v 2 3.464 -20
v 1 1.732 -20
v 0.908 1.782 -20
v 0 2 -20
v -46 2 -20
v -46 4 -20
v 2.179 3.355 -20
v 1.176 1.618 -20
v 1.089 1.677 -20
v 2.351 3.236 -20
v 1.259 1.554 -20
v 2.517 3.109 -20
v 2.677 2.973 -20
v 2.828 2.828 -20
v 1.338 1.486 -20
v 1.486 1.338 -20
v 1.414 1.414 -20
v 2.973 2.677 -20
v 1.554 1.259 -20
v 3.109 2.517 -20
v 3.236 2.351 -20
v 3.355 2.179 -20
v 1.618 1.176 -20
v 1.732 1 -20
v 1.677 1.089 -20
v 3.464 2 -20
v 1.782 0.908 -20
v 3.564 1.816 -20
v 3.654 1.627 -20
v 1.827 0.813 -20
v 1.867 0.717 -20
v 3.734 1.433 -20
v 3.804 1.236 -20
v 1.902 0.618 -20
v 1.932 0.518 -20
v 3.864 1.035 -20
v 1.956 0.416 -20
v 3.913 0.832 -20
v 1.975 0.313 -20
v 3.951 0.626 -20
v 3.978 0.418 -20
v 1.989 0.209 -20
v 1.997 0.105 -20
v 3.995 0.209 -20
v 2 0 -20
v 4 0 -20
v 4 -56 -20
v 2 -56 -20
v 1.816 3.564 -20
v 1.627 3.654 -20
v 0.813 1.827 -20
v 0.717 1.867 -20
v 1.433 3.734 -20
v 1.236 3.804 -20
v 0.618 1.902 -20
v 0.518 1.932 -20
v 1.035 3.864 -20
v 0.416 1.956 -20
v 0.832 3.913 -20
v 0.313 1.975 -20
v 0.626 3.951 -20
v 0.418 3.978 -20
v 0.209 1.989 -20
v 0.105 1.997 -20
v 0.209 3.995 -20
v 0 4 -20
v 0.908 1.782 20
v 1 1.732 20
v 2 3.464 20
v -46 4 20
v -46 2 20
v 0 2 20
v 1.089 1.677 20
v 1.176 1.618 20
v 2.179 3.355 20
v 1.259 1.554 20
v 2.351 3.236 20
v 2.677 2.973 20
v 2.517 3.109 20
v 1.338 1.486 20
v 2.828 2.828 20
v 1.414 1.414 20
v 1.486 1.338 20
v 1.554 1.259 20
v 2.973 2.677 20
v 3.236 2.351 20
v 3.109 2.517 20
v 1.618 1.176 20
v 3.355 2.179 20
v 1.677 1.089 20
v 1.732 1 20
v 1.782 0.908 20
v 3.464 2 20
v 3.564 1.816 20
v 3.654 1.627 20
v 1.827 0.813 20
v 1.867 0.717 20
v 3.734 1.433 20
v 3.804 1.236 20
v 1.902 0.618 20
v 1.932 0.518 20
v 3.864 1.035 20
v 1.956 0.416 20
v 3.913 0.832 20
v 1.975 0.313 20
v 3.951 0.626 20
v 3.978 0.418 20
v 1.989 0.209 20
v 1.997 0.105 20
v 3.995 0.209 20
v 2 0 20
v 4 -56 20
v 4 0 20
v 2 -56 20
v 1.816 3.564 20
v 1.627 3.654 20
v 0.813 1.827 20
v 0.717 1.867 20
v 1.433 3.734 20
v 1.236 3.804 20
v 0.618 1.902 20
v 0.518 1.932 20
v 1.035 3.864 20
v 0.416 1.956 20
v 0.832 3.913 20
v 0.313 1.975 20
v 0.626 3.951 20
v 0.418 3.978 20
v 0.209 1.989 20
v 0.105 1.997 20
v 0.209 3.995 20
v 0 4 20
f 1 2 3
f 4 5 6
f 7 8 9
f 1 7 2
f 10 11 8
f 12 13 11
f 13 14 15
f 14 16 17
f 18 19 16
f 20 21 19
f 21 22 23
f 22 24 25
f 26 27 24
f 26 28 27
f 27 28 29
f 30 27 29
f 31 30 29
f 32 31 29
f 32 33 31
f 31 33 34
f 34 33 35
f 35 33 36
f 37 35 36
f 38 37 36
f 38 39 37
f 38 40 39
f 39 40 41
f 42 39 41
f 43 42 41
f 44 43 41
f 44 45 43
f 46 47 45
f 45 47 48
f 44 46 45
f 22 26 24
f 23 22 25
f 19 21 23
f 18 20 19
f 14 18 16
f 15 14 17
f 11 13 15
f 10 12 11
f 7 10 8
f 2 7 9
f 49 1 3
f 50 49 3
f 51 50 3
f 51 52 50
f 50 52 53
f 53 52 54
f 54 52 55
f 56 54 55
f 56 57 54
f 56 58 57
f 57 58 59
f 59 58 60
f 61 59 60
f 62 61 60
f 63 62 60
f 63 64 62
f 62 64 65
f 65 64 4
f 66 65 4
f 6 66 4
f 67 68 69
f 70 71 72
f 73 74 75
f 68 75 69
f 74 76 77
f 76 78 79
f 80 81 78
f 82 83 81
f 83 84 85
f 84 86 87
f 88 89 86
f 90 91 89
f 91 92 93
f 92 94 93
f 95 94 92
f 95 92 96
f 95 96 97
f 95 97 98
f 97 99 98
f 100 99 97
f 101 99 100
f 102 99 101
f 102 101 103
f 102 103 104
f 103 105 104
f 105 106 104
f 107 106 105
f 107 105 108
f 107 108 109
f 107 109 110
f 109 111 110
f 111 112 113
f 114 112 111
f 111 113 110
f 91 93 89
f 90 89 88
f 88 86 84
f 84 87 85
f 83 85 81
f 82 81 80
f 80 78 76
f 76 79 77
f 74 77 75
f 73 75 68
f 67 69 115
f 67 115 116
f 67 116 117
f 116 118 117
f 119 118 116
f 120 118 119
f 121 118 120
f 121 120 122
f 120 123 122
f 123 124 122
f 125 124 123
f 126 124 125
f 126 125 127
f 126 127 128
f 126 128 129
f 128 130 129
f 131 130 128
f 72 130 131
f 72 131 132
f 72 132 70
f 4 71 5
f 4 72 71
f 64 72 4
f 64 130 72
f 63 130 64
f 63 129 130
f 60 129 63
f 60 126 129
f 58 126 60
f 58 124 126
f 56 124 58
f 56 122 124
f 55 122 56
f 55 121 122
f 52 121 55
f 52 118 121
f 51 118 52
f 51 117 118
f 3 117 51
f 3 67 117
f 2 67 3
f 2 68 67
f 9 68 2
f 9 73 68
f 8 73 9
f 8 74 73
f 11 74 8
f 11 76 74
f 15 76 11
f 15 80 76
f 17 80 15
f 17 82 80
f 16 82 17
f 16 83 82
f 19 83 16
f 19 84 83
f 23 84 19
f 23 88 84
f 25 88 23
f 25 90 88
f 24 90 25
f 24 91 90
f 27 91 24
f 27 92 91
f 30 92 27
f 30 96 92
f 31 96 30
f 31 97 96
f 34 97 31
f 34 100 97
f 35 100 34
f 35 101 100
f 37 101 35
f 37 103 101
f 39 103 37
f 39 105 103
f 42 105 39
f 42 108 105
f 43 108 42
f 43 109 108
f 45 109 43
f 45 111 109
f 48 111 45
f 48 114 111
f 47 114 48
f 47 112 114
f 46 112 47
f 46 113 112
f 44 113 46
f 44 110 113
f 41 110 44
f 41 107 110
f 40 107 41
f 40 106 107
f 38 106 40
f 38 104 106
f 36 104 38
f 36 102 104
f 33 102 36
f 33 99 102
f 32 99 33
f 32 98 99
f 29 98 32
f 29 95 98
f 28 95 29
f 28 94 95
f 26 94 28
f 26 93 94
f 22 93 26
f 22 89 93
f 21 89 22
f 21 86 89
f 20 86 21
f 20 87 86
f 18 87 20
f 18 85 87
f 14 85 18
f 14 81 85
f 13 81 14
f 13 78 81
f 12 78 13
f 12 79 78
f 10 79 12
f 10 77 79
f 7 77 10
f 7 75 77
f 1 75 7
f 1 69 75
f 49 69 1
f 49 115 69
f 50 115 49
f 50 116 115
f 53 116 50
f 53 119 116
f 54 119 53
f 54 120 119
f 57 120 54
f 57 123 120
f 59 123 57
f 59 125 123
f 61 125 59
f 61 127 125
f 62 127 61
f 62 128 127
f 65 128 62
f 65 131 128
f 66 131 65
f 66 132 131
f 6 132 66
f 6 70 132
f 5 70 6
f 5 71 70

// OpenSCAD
// Constant-thickness sheet-metal L-bracket
// Designed by Antigravity (Senior Mechanical & DFM Engineer)

// --- PARAMETERS ---
T  = 2.0;  // Sheet metal thickness (mm)
Ri = 2.0;  // Inside bend radius (mm)
L1 = 60.0; // Outside length of flange 1 (mm)
L2 = 50.0; // Outside length of flange 2 (mm)
W  = 40.0; // Bracket width (mm)
K  = 0.45; // K-factor for bend allowance calculation

// --- CALCULATIONS FOR FLAT PATTERN ---
Ro = Ri + T;
straight1 = L1 - Ro;
straight2 = L2 - Ro;
theta = 90; // Bend angle in degrees
BA = (theta * 3.141592653589793 / 180) * (Ri + K * T);
flat_length = straight1 + straight2 + BA;

// --- DFM MANIFEST ECHO ---
echo(str("MAKERBENCH-SHEETMETAL: {\"thickness_mm\": ", T, ", \"bend_radius_mm\": ", Ri, ", \"flat_length_mm\": ", flat_length, "}"));

// --- 3D GEOMETRY GENERATION ---
$fn = 120; // High resolution cylinder rendering

module L_bracket_2d() {
    // Flange 1 (vertical straight section)
    translate([Ri, -straight1])
        square([T, straight1]);
    
    // Flange 2 (horizontal straight section)
    translate([-straight2, Ri])
        square([straight2, T]);
    
    // 90-degree cylindrical bend segment in the first quadrant
    difference() {
        circle(r = Ro);
        circle(r = Ri);
        // Keep only first quadrant (x >= 0, y >= 0)
        translate([-Ro, -Ro]) square([Ro * 2, Ro]);
        translate([-Ro, 0]) square([Ro, Ro * 2]);
    }
}

// Extrude the 2D profile to create the final 3D solid
linear_extrude(height = W, center = true) {
    L_bracket_2d();
}
